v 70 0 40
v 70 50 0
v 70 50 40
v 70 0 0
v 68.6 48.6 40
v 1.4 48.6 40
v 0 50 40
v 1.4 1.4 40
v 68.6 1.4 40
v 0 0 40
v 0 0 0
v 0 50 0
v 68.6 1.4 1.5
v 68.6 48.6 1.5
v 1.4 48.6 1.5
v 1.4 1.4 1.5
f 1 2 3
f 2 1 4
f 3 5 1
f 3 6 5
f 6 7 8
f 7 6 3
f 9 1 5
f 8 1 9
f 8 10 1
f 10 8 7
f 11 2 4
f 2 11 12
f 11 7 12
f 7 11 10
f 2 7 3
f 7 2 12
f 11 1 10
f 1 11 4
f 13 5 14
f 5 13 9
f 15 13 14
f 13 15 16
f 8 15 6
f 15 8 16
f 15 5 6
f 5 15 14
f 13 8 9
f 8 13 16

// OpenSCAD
$fn = 32;

// ----------------------------------------------------------------------
// Open box: 1.4 mm walls
// ----------------------------------------------------------------------

// --- parameters (mm) ---
box_l = 70;               // outer length, X
box_w = 50;               // outer width, Y
box_h = 40;               // outer height, Z
wall = 1.4;               // wall thickness
floor = 1.5;              // floor thickness

difference() {
  cube([box_l, box_w, box_h]);
  translate([wall, wall, floor])
    cube([box_l - 2 * wall, box_w - 2 * wall, box_h]);
}
